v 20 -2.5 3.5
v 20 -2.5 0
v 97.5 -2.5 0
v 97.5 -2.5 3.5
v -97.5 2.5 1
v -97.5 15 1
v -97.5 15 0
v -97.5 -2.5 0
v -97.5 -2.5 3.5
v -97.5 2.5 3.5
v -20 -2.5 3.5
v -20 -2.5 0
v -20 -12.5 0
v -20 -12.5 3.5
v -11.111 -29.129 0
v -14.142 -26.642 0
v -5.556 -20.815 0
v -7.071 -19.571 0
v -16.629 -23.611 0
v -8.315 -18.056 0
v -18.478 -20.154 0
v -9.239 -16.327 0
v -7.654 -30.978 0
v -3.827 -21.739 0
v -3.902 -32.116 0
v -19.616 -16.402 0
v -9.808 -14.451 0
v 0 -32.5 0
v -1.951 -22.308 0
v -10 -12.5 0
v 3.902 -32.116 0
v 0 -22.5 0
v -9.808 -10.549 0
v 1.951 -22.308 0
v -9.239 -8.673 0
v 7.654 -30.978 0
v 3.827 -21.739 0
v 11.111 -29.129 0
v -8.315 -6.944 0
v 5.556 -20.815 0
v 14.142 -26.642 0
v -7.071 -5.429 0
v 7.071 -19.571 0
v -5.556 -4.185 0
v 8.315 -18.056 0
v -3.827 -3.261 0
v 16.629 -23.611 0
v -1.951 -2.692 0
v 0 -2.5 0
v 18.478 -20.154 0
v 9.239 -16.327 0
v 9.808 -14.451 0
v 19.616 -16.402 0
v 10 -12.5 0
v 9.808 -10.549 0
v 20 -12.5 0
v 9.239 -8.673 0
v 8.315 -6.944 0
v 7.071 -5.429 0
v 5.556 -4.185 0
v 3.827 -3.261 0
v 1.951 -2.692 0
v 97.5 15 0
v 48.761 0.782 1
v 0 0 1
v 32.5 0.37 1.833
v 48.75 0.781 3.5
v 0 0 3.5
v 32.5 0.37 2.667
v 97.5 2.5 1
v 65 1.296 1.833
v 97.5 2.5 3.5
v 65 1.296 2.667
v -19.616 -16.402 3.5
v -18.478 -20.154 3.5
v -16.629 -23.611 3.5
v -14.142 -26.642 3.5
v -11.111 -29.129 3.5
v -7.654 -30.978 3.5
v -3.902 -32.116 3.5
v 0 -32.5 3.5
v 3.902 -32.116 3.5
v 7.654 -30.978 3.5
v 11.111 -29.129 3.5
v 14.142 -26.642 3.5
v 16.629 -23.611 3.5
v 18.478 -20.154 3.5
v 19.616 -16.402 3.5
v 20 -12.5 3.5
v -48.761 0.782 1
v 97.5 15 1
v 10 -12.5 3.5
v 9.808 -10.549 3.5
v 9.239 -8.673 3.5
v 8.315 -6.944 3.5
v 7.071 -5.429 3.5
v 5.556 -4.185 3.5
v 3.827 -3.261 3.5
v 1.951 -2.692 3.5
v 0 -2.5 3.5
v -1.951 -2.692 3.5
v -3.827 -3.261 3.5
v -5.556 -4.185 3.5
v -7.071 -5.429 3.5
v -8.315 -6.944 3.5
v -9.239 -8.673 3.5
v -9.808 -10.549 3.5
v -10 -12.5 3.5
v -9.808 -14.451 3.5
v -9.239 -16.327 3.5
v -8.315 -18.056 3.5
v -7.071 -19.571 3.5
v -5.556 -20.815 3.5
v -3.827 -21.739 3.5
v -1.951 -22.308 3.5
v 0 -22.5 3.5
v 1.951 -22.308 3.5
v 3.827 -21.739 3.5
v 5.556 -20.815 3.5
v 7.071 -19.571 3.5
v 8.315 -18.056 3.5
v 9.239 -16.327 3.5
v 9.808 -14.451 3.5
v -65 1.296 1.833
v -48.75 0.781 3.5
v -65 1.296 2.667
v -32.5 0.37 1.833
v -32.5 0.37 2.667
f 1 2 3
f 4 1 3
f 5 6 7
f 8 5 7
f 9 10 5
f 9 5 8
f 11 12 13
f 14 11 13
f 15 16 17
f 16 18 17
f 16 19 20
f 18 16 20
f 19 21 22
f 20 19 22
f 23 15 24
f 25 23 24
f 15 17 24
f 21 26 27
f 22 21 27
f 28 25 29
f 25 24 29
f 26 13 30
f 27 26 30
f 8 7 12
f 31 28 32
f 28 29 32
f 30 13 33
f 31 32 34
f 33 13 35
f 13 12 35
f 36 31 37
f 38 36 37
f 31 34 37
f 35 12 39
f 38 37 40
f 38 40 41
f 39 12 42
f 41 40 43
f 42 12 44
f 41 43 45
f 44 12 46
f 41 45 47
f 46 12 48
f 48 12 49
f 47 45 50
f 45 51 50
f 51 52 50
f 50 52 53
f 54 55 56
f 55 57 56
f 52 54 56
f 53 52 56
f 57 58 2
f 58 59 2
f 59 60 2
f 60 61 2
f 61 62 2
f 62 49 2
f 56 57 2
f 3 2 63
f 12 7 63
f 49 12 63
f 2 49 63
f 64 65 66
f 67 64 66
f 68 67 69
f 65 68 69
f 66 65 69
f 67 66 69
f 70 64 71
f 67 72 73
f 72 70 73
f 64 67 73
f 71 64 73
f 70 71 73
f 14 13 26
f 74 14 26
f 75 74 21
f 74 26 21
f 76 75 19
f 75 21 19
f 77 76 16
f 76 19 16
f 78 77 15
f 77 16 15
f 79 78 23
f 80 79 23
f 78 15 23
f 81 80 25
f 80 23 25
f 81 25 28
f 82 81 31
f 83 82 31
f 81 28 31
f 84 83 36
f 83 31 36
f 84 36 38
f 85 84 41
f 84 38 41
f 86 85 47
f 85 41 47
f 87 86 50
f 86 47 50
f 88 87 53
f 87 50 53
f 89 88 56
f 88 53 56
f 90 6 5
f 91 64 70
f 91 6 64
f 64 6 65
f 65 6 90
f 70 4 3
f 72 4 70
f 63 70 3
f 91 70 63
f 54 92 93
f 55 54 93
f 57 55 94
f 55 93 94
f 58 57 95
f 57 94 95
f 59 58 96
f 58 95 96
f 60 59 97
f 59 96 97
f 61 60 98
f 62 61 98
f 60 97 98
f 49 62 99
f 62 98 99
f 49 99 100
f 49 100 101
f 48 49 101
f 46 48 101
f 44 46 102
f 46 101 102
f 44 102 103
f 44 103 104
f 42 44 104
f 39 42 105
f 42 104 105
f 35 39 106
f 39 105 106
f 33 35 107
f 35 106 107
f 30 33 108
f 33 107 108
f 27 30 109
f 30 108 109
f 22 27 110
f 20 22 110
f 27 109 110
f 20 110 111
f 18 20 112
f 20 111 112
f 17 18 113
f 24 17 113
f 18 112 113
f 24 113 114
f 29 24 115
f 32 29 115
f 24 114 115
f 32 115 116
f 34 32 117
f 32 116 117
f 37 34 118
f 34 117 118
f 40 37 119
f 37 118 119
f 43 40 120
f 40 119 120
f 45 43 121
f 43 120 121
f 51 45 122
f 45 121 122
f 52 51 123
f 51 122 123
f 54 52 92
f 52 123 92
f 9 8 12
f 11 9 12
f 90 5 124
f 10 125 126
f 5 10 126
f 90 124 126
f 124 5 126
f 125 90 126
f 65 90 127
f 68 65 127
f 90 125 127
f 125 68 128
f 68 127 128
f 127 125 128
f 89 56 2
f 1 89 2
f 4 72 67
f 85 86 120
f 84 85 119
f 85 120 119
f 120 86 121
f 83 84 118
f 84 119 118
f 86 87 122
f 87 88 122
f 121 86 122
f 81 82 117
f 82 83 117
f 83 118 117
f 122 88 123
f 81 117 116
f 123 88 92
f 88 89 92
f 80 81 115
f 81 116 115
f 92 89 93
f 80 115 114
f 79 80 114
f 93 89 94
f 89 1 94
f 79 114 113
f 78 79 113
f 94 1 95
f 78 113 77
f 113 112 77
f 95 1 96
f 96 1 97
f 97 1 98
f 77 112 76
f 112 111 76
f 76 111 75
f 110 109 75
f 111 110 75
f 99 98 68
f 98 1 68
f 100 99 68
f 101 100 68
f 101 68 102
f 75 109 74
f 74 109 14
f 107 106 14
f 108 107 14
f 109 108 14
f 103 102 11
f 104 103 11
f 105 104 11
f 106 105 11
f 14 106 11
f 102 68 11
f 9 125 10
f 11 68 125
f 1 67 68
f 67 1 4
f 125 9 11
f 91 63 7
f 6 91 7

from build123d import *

# Parameters (mm, degrees)
F0_W      = 97.5
F0_H      = 15
F1_DEPTH  = 1
F2_W      = 77.5
F2_H      = 2.5
F3_DEPTH  = 3.5
F4_DEPTH  = 3.5
F5_R      = 10
F7_DEPTH  = 3.5
F10_DEPTH = 3.5


# Not quite as in the source:
# - a feature of the source that left no trace in its solid (it failed there, or was rolled back) is left out
# - a feature names something its author has since deleted; it is built from what else it names


with BuildPart() as f1:
    # F0 (on Top) → F1 (new body)
    with BuildSketch(Plane.XY):
        with Locations((-48.75, 7.5)):
            Rectangle(F0_W, F0_H)
        with Locations((48.75, 7.5)):
            Rectangle(F0_W, F0_H)
    extrude(amount=F1_DEPTH)

    # F2 (on Top) → F3 (join)
    with BuildSketch(Plane.XY):
        with Locations((58.75, -1.25)):
            Rectangle(F2_W, F2_H)
        with Locations((-58.75, -1.25)):
            Rectangle(F2_W, F2_H)
        with BuildLine():
            ThreePointArc((-17.3205080757, -2.5), (-16.5138781887, -1.2176320229), (-15.612494996, 0))
            Line((-15.612494996, 0), (-20, 0))
            Line((-20, 0), (-20, -2.5))
            Line((-20, -2.5), (-17.3205080757, -2.5))
        make_face()
        with BuildLine():
            ThreePointArc((-20, -12.5), (-19.3185165258, -7.3236190979), (-17.3205080757, -2.5))
            Line((-17.3205080757, -2.5), (-20, -2.5))
            Line((-20, -2.5), (-20, -12.5))
        make_face()
        with BuildLine():
            Line((20, 0), (15.612494996, 0))
            ThreePointArc((15.612494996, 0), (16.5138781887, -1.2176320229), (17.3205080757, -2.5))
            Line((17.3205080757, -2.5), (20, -2.5))
            Line((20, -2.5), (20, 0))
        make_face()
        with BuildLine():
            Line((20, -2.5), (17.3205080757, -2.5))
            ThreePointArc((17.3205080757, -2.5), (19.3185165258, -7.3236190979), (20, -12.5))
            Line((20, -12.5), (20, -2.5))
        make_face()
    extrude(amount=F3_DEPTH)

    # F2 (on Top) → F4 (join)
    with BuildSketch(Plane.XY):
        with BuildLine():
            Line((15.612494996, 0), (0, 0))
            Line((0, 0), (-15.612494996, 0))
            ThreePointArc((-15.612494996, 0), (-16.5138781887, -1.2176320229), (-17.3205080757, -2.5))
            Line((-17.3205080757, -2.5), (17.3205080757, -2.5))
            ThreePointArc((17.3205080757, -2.5), (16.5138781887, -1.2176320229), (15.612494996, 0))
        make_face()
        with BuildLine():
            ThreePointArc((20, -12.5), (19.3185165258, -7.3236190979), (17.3205080757, -2.5))
            Line((17.3205080757, -2.5), (-17.3205080757, -2.5))
            ThreePointArc((-17.3205080757, -2.5), (-19.3185165258, -7.3236190979), (-20, -12.5))
            Line((-20, -12.5), (20, -12.5))
        make_face()
        with BuildLine():
            ThreePointArc((-20, -12.5), (0, -32.5), (20, -12.5))
            Line((20, -12.5), (-20, -12.5))
        make_face()
    extrude(amount=F4_DEPTH)

    # F6: union 

    # F5 (on face) → F7 (cut)
    with BuildSketch(Plane.XY.offset(3.5)):
        with Locations((0, -12.5)):
            Circle(F5_R)
    extrude(amount=-F7_DEPTH, mode=Mode.SUBTRACT)

    # F8 (on face) → F10 (join)
    with BuildSketch(Plane.XY.offset(3.5)):
        with BuildLine():
            add(Edge.make_bspline(
                [(-97.5, 2.5), (-65, 1.25), (-32.5, 0), (0, 0)],
                knots=[0, 0, 0, 0, 0.5, 0.5, 0.5, 0.5], degree=3))
            Line((-97.5, 2.5), (-97.5, 0))
            Line((-97.5, 0), (0, 0))
        make_face()
        with BuildLine():
            add(Edge.make_bspline(
                [(0, 0), (32.5, 0), (65, 1.25), (97.5, 2.5)],
                knots=[0.5, 0.5, 0.5, 0.5, 1, 1, 1, 1], degree=3))
            Line((0, 0), (97.5, 0))
            Line((97.5, 0), (97.5, 2.5))
        make_face()
    extrude(amount=-F10_DEPTH)


solid = f1.part
